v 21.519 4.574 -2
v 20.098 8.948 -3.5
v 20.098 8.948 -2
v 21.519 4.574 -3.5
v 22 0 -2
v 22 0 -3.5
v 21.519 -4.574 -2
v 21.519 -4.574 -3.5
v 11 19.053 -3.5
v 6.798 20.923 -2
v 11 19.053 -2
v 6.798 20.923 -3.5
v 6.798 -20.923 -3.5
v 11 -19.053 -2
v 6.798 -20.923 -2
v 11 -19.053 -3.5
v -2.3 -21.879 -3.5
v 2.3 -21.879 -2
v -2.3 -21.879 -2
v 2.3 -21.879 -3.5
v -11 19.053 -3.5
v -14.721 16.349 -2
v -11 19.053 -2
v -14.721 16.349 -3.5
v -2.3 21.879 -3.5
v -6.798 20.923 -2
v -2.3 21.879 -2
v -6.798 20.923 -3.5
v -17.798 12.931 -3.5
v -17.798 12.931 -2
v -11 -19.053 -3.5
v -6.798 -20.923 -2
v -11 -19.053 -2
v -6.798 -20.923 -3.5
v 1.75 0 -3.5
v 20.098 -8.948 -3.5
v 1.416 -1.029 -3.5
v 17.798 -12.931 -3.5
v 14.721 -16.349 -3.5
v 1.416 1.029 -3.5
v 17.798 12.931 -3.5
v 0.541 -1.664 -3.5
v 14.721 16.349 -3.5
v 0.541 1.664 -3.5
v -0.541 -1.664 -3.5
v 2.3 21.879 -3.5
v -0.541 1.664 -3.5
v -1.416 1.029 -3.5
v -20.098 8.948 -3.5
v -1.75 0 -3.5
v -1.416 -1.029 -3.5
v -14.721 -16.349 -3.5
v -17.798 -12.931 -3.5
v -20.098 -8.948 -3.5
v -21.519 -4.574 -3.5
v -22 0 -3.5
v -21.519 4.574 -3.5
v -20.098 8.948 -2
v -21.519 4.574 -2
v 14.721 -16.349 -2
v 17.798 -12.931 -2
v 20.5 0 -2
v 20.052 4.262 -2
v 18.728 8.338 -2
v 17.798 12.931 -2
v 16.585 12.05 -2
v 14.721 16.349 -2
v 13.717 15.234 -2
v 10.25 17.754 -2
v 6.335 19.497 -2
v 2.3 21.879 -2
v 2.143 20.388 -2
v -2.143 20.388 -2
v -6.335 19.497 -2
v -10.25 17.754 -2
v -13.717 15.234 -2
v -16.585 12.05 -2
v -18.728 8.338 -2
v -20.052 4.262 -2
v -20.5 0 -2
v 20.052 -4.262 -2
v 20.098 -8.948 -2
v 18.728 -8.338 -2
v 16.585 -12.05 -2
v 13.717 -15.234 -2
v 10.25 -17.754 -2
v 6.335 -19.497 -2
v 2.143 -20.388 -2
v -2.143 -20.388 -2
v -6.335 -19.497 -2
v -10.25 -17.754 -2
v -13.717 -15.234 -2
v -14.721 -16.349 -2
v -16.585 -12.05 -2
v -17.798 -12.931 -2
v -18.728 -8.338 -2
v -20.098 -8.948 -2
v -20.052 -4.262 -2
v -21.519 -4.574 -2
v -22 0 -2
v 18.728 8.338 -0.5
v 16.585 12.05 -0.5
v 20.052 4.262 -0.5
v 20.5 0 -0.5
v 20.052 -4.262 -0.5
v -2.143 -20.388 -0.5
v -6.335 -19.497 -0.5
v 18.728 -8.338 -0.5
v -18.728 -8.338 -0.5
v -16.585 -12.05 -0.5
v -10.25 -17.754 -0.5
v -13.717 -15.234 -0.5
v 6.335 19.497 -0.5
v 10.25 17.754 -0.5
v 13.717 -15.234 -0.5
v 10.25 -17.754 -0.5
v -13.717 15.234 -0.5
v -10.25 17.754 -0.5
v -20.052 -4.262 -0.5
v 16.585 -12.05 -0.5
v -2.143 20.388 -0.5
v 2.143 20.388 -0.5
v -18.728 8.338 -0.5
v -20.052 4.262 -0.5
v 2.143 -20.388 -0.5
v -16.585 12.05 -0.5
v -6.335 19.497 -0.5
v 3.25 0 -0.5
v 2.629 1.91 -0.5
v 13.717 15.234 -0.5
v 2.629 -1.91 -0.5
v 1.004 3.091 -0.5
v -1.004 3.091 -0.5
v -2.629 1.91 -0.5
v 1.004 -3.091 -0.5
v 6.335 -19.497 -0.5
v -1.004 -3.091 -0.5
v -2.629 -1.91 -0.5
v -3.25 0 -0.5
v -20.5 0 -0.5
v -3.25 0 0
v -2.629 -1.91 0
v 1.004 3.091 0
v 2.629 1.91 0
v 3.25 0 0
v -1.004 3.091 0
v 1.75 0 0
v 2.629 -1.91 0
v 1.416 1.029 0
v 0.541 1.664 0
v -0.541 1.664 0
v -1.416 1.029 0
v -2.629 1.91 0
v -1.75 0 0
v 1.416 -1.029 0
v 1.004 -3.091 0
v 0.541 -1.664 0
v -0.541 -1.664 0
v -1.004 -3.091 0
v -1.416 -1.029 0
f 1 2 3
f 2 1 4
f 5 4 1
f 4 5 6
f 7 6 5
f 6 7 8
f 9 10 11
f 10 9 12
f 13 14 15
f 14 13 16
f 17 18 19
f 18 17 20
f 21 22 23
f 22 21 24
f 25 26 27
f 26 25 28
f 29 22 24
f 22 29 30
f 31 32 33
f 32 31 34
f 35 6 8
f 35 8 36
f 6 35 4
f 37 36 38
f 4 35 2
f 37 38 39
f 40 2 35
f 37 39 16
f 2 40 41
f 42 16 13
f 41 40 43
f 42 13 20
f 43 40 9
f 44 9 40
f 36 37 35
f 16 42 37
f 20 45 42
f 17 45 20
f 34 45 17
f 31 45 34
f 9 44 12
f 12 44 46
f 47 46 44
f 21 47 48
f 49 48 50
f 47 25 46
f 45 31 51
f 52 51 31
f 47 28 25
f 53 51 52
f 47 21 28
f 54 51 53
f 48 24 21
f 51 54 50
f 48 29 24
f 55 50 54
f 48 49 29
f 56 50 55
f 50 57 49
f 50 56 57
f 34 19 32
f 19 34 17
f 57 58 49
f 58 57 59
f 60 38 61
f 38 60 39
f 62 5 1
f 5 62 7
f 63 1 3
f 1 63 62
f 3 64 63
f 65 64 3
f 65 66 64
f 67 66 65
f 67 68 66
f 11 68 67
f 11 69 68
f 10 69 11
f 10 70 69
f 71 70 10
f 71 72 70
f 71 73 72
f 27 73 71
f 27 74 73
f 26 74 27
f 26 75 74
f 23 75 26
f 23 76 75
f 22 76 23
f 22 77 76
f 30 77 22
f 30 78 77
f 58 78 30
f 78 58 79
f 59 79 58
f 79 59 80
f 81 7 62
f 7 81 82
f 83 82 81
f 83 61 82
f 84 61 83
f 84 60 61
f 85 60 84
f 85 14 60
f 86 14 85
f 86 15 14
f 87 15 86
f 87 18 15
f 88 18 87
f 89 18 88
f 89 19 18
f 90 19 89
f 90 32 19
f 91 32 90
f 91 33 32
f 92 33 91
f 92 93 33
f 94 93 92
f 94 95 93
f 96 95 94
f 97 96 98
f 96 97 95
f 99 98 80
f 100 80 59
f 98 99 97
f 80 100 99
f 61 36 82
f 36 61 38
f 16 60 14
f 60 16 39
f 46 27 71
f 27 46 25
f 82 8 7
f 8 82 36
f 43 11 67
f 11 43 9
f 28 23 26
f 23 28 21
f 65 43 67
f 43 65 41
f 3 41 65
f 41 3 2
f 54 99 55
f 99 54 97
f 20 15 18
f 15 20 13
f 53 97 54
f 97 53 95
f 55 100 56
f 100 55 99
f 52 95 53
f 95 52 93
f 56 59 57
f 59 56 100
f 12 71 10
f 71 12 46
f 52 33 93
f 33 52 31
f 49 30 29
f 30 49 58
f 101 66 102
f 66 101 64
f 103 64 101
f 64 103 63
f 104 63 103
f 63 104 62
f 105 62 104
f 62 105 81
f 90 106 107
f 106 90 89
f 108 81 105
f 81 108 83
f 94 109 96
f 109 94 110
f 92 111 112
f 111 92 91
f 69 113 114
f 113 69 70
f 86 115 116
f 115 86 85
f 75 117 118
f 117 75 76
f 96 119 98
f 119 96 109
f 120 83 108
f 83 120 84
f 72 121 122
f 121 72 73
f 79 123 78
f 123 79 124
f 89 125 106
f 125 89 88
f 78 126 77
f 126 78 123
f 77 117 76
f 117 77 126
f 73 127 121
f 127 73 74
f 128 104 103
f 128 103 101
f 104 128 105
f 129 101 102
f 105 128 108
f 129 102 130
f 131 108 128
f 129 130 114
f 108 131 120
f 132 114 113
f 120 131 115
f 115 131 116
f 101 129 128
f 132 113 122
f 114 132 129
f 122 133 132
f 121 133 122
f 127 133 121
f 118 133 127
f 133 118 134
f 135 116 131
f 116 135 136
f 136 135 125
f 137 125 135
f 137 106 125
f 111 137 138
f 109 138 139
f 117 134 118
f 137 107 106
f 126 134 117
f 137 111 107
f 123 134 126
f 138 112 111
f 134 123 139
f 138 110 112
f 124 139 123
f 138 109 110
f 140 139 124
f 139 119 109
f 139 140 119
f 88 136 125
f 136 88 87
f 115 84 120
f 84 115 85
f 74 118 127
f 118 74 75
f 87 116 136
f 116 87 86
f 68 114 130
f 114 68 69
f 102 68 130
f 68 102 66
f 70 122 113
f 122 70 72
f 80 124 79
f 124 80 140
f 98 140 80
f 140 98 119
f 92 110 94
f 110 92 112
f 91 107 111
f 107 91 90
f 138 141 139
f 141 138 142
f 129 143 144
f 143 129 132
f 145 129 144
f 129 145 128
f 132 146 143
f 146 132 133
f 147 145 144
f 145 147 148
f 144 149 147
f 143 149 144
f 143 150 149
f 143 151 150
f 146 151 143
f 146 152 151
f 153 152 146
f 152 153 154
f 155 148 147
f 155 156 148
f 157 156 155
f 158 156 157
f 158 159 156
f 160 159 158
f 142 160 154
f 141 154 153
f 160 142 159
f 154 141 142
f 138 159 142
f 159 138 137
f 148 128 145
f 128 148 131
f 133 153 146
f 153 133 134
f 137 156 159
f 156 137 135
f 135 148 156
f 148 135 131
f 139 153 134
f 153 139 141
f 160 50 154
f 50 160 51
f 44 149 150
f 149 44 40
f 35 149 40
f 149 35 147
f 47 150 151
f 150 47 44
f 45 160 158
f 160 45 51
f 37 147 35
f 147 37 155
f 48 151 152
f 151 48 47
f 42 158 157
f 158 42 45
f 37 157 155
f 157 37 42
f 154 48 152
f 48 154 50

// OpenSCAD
// 2/4/2011 18:30

blade_radius1=12;
blade_radius2=9;
blade_thickness=1.5;
blade_length=20;
chord_dist=sqrt(pow(blade_radius1,2)-pow(blade_length/2,2));
blade_width=blade_radius1-chord_dist;
blade_length2=2*sqrt(pow(blade_radius2,2)-pow(chord_dist,2));
top_radius=blade_length-(blade_length-blade_length2)/2;
blade_height=8;
num_blades=8;
wheel_base_height=1.05;
hub_radius1=4;
hub_radius2=4;
hub_height=9.1;
axle_radius=1.5;
housing_space=0.5;
wall_thickness=1.5;
inlet_radius=blade_height/2;
inlet_length=25;
outlet_height=0;
outlet_radius=8;
axle_space=0.25;

slope=(blade_length-top_radius)/blade_height;

echo(str("Blade Width  is ",blade_width));
echo(str("Blade Length 2 is ",blade_length2));
echo(str("Radius of top of wheel is ",top_radius));


//wheel();
//housing_top();
housing_bottom();


module housing_top() {
		
		cavity_radius1=blade_length+housing_space;
		cavity_radius2=top_radius+housing_space;
		
		housing_radius1=blade_length+wall_thickness+housing_space+slope*(wall_thickness*2+housing_space*2);
		housing_radius2=housing_radius1-slope*(blade_height+wheel_base_height+housing_space*2+wall_thickness*2);
		echo(str("Slope is ",slope));

		difference() {
			union() {
				translate([0,0,-(wall_thickness+housing_space)]) cylinder(r1=housing_radius1,r2=housing_radius2,h=blade_height+wheel_base_height+housing_space*2+wall_thickness*2);
				inlet();
				cylinder(r=outlet_radius+wall_thickness,h=outlet_height+blade_height+wheel_base_height+housing_space+wall_thickness);
			}
			 translate([(cavity_radius1+cavity_radius2)/2-inlet_radius-wall_thickness,0,inlet_radius+wall_thickness]) rotate([90,0,0]) cylinder(r=inlet_radius,h=inlet_length);			
			difference() {
				translate([0,0,wheel_base_height]) cylinder(r1=cavity_radius1, r2=cavity_radius2,h=blade_height+housing_space);
				translate([0,0,wheel_base_height+blade_height]) cylinder(r=axle_radius+wall_thickness+axle_space,h=housing_space, $fn=10);
			}
			translate([0,0,-(wall_thickness+housing_space)]) cylinder(r=cavity_radius1, h=wall_thickness+housing_space*2+wheel_base_height);
			cylinder(r=axle_radius+axle_space,h=outlet_height+blade_height+wheel_base_height+housing_space+wall_thickness,$fn=10);
			outlet();
		}
}

module inlet() {
	housing_height=blade_height+wheel_base_height+housing_space*2+wall_thickness*2;
	translate([-(inlet_radius*2+wall_thickness-top_radius),0,-(housing_space+wall_thickness)]) rotate([90,0,0]) linear_extrude(height=inlet_length)
		polygon(points=[[0,0],[0,housing_height],[inlet_radius*2+wall_thickness*2,housing_height],[inlet_radius*2+wall_thickness*2+slope*housing_height,0]], paths=[[0,1,2,3,0]]);
}

module outlet() {
	height=outlet_height+blade_height+wheel_base_height+housing_space+wall_thickness;
	difference() {
		cylinder(r=outlet_radius,h=height);
		for (c=[1:3]) rotate([0,0,c*120]) translate([0,-wall_thickness/2,0]) cube([outlet_radius,wall_thickness,height]);
		cylinder(r=axle_radius+wall_thickness+axle_space,h=height);
		
	}
}


module housing_bottom() {
	difference() {
		union() {
			translate([0,0,-(wall_thickness*2+housing_space)]) cylinder(r=(blade_length+housing_space+wall_thickness),h=wall_thickness);
			translate([0,0,-(wall_thickness+housing_space)]) cylinder(r=(blade_length+housing_space),h=wall_thickness);
			translate([0,0,-housing_space]) cylinder(r=axle_radius+wall_thickness+axle_space,h=housing_space, $fn=10);
		}
		translate([0,0,-(wall_thickness*2+housing_space)]) cylinder(r=axle_radius+axle_space,h=wall_thickness*2+housing_space,$fn=10);
	}

}

module wheel() {
	difference() {
		union() {
			translate([0,0,wheel_base_height]) for (a=[1:num_blades]) rotate([0,0,a*(360/num_blades)]) translate([0,0,0]) blade();
			cylinder(r=blade_length,h=wheel_base_height);
			cylinder(r1=hub_radius1, r2=hub_radius2, h=hub_height);
		}
		cylinder(r=axle_radius,h=max(hub_height,blade_height+wheel_base_height), $fn=10);
	}
}

module blade() {
	angle=asin((blade_radius1-blade_width)/blade_radius1);
	translate([0,blade_radius1,0]) rotate([0,0,angle]) difference() {
		cylinder(r1=blade_radius1,r2=blade_radius2, h=blade_height);
		cylinder(r1=blade_radius1-blade_thickness,r2=blade_radius2-blade_thickness,h=blade_height);
		translate([blade_width-blade_radius1,-blade_radius1,0]) cube([blade_radius1*2,blade_radius1*2,blade_height]);
	}

}
